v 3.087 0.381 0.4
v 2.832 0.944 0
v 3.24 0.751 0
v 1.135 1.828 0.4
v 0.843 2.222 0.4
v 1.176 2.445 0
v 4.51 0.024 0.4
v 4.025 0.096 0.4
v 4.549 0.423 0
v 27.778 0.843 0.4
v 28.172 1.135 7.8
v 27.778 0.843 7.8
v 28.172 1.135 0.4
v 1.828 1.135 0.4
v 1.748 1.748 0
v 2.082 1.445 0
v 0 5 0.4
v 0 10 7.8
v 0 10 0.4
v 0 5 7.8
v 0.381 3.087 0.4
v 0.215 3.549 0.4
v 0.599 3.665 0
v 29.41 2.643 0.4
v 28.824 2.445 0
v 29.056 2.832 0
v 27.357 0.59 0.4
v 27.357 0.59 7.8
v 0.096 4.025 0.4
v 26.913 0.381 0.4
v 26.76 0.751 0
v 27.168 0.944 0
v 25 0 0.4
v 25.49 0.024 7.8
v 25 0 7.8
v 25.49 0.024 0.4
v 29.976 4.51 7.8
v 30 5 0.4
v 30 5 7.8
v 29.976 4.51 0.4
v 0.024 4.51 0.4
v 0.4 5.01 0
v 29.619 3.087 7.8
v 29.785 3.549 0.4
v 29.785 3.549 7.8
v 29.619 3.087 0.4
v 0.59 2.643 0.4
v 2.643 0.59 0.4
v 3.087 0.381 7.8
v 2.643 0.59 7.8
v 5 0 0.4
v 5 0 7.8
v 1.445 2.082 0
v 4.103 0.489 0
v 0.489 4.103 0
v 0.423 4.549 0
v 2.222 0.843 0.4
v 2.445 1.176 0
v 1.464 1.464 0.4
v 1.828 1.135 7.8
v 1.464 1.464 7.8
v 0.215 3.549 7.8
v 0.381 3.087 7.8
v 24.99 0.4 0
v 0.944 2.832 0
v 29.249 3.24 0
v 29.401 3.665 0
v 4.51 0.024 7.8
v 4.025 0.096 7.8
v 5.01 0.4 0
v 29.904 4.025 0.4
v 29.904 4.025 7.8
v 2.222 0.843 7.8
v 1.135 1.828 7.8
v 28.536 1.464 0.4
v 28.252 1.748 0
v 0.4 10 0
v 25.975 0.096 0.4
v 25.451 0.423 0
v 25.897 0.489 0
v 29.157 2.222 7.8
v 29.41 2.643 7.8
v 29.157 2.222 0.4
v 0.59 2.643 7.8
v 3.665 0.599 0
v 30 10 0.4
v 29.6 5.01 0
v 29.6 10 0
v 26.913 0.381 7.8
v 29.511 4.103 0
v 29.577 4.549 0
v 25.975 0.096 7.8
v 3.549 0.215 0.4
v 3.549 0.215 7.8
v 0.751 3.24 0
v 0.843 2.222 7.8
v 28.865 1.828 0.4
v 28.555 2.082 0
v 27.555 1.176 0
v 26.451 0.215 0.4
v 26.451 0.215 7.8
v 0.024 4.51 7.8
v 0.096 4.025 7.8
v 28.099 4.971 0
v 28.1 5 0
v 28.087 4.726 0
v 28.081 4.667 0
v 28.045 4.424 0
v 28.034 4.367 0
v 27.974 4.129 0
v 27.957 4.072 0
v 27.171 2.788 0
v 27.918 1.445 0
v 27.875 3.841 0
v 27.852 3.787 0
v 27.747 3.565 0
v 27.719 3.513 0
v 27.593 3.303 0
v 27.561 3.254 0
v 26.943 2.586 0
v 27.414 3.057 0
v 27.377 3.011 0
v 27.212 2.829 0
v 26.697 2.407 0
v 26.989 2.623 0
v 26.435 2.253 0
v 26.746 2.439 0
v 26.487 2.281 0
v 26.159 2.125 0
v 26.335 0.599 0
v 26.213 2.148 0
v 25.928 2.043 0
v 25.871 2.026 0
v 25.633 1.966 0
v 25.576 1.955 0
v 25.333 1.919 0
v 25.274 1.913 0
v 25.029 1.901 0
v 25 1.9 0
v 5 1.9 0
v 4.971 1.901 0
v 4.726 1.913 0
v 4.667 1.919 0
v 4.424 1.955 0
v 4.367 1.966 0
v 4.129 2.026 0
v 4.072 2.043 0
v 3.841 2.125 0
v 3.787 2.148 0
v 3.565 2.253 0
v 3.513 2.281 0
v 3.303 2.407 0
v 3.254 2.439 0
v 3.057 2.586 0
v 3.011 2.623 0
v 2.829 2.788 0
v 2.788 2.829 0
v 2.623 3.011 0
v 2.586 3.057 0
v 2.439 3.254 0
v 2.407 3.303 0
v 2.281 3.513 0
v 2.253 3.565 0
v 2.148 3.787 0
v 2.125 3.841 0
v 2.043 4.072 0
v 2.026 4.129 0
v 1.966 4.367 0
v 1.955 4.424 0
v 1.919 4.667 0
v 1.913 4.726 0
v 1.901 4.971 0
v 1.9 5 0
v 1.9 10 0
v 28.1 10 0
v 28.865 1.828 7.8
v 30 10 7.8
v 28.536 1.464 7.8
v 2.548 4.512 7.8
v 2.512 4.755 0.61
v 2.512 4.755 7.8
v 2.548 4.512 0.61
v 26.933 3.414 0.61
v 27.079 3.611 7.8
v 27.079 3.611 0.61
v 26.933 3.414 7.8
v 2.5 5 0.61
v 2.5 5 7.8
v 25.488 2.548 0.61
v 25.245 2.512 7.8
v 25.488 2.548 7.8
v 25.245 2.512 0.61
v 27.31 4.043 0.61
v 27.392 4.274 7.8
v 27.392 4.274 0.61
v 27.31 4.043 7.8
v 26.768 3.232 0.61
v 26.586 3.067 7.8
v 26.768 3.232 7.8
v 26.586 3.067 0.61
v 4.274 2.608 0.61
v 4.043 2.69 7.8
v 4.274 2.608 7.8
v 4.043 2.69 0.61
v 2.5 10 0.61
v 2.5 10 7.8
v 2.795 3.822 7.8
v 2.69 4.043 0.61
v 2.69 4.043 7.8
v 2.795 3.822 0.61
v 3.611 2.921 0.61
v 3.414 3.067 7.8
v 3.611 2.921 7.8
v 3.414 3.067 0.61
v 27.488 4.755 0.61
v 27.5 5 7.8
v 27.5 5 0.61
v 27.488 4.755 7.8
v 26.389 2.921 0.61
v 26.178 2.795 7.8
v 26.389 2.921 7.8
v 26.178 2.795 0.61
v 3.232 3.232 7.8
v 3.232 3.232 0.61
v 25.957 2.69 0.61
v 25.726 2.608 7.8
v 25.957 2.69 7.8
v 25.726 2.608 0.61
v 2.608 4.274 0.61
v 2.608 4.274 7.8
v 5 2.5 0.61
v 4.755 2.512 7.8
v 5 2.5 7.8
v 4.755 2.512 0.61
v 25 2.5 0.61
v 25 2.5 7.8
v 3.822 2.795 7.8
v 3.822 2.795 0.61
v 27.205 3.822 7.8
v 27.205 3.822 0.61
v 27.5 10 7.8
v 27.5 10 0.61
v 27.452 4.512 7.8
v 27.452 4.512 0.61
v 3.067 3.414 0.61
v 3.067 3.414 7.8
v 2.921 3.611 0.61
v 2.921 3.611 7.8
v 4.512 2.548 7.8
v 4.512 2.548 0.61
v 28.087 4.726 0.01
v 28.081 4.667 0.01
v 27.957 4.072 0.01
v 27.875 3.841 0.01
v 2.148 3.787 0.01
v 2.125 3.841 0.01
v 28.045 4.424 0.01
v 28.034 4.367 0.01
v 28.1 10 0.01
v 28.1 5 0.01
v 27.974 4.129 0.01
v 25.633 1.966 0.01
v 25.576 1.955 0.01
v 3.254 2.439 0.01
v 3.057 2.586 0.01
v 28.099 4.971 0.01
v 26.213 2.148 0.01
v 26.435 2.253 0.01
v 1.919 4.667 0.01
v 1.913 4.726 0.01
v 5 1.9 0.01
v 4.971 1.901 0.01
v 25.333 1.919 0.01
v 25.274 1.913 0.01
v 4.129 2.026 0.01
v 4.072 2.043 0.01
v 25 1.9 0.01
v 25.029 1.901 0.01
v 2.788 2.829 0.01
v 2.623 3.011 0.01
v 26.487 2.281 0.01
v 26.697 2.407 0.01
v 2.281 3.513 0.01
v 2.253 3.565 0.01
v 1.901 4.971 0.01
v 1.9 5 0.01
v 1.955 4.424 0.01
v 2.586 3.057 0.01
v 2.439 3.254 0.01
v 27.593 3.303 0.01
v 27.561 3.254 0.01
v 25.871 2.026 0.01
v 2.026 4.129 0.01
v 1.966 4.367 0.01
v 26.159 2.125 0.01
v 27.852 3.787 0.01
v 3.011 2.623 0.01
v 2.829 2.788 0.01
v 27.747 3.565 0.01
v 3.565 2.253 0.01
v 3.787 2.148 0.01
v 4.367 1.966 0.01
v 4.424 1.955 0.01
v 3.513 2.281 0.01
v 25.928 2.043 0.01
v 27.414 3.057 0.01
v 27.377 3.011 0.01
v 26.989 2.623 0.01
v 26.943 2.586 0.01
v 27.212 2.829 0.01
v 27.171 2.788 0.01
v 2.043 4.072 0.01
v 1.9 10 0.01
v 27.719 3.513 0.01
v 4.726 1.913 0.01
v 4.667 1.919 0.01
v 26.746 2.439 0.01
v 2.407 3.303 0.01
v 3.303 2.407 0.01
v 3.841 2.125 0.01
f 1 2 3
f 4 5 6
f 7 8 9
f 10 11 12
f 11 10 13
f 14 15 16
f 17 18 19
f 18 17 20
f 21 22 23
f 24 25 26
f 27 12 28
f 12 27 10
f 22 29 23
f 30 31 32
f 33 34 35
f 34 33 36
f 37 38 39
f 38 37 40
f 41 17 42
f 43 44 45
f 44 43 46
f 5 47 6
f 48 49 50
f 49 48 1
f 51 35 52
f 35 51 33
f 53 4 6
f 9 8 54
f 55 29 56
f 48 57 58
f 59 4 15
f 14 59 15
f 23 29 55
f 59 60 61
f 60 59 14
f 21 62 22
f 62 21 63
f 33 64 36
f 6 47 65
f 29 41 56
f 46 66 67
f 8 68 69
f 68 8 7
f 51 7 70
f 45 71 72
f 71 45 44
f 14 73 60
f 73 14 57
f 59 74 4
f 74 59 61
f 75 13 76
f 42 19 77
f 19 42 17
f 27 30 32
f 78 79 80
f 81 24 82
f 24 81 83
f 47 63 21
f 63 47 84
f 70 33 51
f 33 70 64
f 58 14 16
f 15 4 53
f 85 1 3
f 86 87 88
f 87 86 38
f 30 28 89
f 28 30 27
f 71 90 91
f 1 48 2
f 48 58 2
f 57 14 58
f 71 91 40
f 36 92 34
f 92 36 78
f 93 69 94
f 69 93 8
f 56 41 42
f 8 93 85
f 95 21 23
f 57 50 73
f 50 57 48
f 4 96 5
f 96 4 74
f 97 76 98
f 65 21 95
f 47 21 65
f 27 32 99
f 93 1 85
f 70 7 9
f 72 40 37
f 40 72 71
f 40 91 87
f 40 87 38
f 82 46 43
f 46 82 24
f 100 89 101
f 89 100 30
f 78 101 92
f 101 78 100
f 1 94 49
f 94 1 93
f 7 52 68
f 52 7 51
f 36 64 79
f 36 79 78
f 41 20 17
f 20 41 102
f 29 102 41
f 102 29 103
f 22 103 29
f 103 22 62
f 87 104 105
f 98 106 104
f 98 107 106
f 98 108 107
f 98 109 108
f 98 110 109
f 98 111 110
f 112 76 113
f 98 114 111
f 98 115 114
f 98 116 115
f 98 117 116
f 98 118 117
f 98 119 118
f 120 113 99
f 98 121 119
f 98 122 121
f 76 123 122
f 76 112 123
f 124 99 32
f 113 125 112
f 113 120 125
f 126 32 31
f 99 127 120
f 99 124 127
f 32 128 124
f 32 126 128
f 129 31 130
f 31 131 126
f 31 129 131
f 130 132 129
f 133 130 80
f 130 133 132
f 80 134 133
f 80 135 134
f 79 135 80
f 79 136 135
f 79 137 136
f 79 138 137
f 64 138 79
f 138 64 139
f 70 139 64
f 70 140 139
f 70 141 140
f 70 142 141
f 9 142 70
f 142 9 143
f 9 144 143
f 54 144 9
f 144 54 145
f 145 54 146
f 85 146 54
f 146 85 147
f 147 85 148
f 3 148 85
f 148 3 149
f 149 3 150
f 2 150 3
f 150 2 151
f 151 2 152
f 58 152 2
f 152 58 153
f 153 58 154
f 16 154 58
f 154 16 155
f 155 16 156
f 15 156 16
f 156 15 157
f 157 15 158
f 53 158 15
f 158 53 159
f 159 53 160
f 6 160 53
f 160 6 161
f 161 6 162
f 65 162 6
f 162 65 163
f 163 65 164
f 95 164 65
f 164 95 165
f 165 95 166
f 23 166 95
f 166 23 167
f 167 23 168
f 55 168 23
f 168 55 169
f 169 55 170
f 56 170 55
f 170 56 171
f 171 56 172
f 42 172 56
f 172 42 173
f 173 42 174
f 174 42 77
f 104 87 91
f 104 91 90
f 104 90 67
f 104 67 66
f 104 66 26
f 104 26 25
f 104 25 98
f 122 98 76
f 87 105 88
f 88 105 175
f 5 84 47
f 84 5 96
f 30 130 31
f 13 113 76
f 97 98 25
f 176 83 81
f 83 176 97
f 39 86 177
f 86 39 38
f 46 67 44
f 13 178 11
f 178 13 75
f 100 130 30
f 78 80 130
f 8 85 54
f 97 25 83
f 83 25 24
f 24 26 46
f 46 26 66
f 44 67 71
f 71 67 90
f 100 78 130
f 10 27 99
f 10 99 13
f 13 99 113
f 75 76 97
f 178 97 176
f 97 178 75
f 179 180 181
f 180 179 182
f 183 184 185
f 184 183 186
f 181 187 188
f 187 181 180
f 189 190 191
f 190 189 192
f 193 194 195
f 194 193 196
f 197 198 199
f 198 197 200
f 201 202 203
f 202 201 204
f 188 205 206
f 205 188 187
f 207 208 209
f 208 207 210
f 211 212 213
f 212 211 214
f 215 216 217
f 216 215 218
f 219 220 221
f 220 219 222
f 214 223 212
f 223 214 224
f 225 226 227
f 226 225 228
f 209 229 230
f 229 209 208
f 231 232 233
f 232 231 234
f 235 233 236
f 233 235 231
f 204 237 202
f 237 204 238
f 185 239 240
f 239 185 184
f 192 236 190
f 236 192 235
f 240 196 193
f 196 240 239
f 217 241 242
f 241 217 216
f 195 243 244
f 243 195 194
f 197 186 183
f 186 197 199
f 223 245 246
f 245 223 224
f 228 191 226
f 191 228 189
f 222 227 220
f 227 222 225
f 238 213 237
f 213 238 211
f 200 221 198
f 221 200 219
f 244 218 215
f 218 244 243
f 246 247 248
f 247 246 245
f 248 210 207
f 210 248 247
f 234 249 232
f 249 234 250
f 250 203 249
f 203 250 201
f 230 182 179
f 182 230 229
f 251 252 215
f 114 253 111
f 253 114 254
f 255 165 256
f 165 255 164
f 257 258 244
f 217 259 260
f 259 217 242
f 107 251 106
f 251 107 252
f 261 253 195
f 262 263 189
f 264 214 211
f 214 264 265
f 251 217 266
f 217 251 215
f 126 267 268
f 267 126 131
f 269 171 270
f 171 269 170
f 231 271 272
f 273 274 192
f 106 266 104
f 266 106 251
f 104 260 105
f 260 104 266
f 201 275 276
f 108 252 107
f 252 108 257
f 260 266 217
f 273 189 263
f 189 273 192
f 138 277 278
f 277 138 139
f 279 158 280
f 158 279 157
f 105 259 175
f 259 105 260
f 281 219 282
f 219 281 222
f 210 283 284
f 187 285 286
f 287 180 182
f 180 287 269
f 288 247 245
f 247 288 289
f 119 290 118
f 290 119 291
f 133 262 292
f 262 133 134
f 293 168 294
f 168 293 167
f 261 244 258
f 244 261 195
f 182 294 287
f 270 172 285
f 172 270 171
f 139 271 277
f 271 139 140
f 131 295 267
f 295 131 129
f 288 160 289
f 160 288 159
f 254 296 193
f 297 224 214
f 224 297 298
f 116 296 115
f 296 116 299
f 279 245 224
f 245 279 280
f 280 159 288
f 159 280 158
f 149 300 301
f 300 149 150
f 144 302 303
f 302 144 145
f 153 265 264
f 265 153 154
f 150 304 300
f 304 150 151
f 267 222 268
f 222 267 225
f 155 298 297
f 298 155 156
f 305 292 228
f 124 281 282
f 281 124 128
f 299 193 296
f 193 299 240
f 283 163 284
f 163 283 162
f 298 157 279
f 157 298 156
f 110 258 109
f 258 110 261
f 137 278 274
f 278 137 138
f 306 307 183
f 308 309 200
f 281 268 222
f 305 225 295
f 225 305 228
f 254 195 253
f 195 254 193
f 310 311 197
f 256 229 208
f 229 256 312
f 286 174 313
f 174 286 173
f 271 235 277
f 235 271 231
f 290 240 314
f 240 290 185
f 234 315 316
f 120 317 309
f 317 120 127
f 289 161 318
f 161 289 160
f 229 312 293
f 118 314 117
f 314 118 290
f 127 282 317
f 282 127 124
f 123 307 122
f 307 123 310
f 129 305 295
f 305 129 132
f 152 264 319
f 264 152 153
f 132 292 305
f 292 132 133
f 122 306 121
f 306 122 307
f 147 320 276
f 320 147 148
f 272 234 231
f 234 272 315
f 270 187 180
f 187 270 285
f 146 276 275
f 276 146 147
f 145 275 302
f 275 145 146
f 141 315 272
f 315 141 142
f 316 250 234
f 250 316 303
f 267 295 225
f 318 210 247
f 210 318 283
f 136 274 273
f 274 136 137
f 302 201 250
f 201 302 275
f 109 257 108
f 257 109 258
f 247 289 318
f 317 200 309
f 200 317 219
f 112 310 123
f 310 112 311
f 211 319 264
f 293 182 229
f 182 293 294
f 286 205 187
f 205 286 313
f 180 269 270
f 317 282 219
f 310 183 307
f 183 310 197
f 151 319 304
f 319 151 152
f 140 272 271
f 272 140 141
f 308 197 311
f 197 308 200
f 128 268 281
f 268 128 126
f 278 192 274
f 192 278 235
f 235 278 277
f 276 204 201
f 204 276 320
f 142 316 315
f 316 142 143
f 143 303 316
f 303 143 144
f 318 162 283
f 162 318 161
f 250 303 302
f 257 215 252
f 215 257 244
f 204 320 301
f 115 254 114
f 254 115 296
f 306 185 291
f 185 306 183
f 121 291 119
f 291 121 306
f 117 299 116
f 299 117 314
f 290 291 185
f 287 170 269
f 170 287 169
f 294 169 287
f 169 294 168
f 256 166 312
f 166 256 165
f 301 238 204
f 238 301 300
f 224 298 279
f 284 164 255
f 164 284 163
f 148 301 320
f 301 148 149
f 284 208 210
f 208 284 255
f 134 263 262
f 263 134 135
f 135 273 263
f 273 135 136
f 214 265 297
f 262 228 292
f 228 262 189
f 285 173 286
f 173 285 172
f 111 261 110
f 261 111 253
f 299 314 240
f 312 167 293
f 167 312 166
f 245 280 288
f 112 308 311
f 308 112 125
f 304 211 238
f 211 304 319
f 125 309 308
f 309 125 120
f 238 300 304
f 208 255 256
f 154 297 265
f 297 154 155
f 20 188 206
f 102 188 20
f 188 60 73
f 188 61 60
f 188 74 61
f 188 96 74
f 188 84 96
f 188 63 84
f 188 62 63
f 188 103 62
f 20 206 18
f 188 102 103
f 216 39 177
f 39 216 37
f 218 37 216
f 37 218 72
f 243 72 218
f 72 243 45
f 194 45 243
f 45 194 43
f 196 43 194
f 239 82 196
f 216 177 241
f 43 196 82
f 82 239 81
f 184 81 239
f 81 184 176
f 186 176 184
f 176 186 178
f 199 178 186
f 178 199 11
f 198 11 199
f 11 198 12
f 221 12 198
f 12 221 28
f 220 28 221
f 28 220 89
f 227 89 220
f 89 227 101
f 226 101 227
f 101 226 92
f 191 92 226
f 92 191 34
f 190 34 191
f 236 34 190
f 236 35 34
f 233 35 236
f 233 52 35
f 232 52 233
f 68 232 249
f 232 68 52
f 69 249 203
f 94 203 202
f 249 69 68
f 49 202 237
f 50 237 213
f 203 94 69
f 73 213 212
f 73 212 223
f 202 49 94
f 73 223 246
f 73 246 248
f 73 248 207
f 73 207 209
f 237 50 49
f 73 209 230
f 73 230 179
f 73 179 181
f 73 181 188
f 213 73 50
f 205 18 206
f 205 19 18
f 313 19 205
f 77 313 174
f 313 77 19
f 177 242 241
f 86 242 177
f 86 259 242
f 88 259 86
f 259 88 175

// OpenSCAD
// Rounded rectangular tube — construction walkthrough.
//
// Standalone teaching file for the rounded rectangular tube example.
// It exposes each construction step used for the outside and inside
// end chamfers. It is not the printable source file.

$fn = 64;

design_step = "09_chamfer_closeup"; // [01_profiles,02_outer_chamfer_inputs,03_outer_hull,04_hollow_tube,05_inner_chamfer_inputs,06_inner_chamfer_cut,07_bottom_chamfer_result,08_final,09_chamfer_closeup]

outer_width     = 30;
outer_depth     = 20;
length          = 60;
wall_thickness  = 2.5;
outer_radius    = 5;

inner_chamfer   = 0.6;
outer_chamfer   = 0.4;
epsilon         = 0.01;

inner_width  = outer_width - 2 * wall_thickness;
inner_depth  = outer_depth - 2 * wall_thickness;
inner_radius = max(outer_radius - wall_thickness, 0.01);

// ---------- Shared geometry ----------

module rounded_rectangle(width, depth, radius) {
    hull()
        for (x = [radius, width - radius],
             y = [radius, depth - radius])
            translate([x, y])
                circle(radius);
}

module outer_2d() {
    rounded_rectangle(outer_width, outer_depth, outer_radius);
}

module inner_2d() {
    translate([wall_thickness, wall_thickness])
        rounded_rectangle(inner_width, inner_depth, inner_radius);
}

module outer_end_layer(z, inset = 0, thickness = 0.06) {
    translate([0, 0, z])
        linear_extrude(thickness)
            offset(delta = inset)
                outer_2d();
}

module inner_end_layer(z, expansion = 0, thickness = 0.06) {
    translate([0, 0, z])
        linear_extrude(thickness)
            offset(delta = expansion)
                inner_2d();
}

module outer_body() {
    hull() {
        translate([0, 0, 0])
            linear_extrude(epsilon)
                offset(delta = -outer_chamfer)
                    outer_2d();

        translate([0, 0, outer_chamfer])
            linear_extrude(length - 2 * outer_chamfer)
                outer_2d();

        translate([0, 0, length - epsilon])
            linear_extrude(epsilon)
                offset(delta = -outer_chamfer)
                    outer_2d();
    }
}

module continuous_inner_void(extra = 1) {
    translate([0, 0, -extra])
        linear_extrude(length + 2 * extra)
            inner_2d();
}

module inner_chamfer_cut() {
    hull() {
        translate([0, 0, -epsilon])
            linear_extrude(2 * epsilon)
                offset(r = inner_chamfer)
                    inner_2d();

        translate([0, 0, inner_chamfer])
            linear_extrude(epsilon)
                inner_2d();
    }
}

module hollow_tube_without_inner_chamfers() {
    difference() {
        outer_body();
        continuous_inner_void();
    }
}

module final_tube() {
    difference() {
        hollow_tube_without_inner_chamfers();

        inner_chamfer_cut();

        translate([0, 0, length])
            mirror([0, 0, 1])
                inner_chamfer_cut();
    }
}

// ---------- Walkthrough stages ----------

module stage_01_profiles() {
    // The profiles are shown as thin solids so both are visible in 3D.
    color([0.20, 0.55, 0.85])
        linear_extrude(0.6)
            outer_2d();

    color([0.95, 0.50, 0.15])
        translate([0, 0, 0.8])
            linear_extrude(0.6)
                inner_2d();
}

module stage_02_outer_chamfer_inputs() {
    // Orange: smaller end-face profile.
    color([0.95, 0.45, 0.15])
        outer_end_layer(0, -outer_chamfer, 0.08);

    // Blue: normal outer profile, only 0.4 mm farther inside.
    color([0.20, 0.55, 0.85])
        outer_end_layer(outer_chamfer, 0, 0.08);

    // Ghost a short normal continuation to show which profile continues.
    %translate([0, 0, outer_chamfer])
        linear_extrude(5)
            outer_2d();
}

module stage_03_outer_hull() {
    // Show only the lower 8 mm so the small outside chamfer stays visible.
    intersection() {
        outer_body();

        translate([-2, -2, -0.2])
            cube([outer_width + 4, outer_depth + 4, 8]);
    }
}

module stage_04_hollow_tube() {
    // Same lower section, now with the normal through-hole removed.
    intersection() {
        hollow_tube_without_inner_chamfers();

        translate([-2, -2, -0.2])
            cube([outer_width + 4, outer_depth + 4, 10]);
    }
}

module stage_05_inner_chamfer_inputs() {
    // Orange: enlarged opening at the end face.
    color([0.95, 0.45, 0.15])
        inner_end_layer(0, inner_chamfer, 0.08);

    // Blue: normal opening 0.6 mm farther into the tube.
    color([0.20, 0.55, 0.85])
        inner_end_layer(inner_chamfer, 0, 0.08);

    // Ghost the lower tube section for context.
    %intersection() {
        hollow_tube_without_inner_chamfers();

        translate([-2, -2, -0.2])
            cube([outer_width + 4, outer_depth + 4, 7]);
    }
}

module stage_06_inner_chamfer_cut() {
    // The hull is a solid tapered cutter. Much of it is already inside the
    // normal hollow opening; only its outer rim overlaps the tube wall.
    color([0.95, 0.35, 0.12])
        inner_chamfer_cut();

    %intersection() {
        hollow_tube_without_inner_chamfers();

        translate([-2, -2, -0.2])
            cube([outer_width + 4, outer_depth + 4, 7]);
    }
}

module stage_07_bottom_chamfer_result() {
    // Apply only the lower inside-chamfer cutter.
    difference() {
        intersection() {
            hollow_tube_without_inner_chamfers();

            translate([-2, -2, -0.2])
                cube([outer_width + 4, outer_depth + 4, 8]);
        }

        inner_chamfer_cut();
    }
}

module stage_08_final() {
    final_tube();
}

module stage_09_chamfer_closeup() {
    // Half-depth cutaway of the lower 8 mm. This shows the outside and
    // inside chamfers together and makes the remaining wall easy to inspect.
    intersection() {
        final_tube();

        translate([-2, -2, -0.2])
            cube([
                outer_width + 4,
                outer_depth / 2 + 2,
                8
            ]);
    }
}

// ---------- Selector ----------

if (design_step == "01_profiles")
    stage_01_profiles();
else if (design_step == "02_outer_chamfer_inputs")
    stage_02_outer_chamfer_inputs();
else if (design_step == "03_outer_hull")
    stage_03_outer_hull();
else if (design_step == "04_hollow_tube")
    stage_04_hollow_tube();
else if (design_step == "05_inner_chamfer_inputs")
    stage_05_inner_chamfer_inputs();
else if (design_step == "06_inner_chamfer_cut")
    stage_06_inner_chamfer_cut();
else if (design_step == "07_bottom_chamfer_result")
    stage_07_bottom_chamfer_result();
else if (design_step == "08_final")
    stage_08_final();
else
    stage_09_chamfer_closeup();
